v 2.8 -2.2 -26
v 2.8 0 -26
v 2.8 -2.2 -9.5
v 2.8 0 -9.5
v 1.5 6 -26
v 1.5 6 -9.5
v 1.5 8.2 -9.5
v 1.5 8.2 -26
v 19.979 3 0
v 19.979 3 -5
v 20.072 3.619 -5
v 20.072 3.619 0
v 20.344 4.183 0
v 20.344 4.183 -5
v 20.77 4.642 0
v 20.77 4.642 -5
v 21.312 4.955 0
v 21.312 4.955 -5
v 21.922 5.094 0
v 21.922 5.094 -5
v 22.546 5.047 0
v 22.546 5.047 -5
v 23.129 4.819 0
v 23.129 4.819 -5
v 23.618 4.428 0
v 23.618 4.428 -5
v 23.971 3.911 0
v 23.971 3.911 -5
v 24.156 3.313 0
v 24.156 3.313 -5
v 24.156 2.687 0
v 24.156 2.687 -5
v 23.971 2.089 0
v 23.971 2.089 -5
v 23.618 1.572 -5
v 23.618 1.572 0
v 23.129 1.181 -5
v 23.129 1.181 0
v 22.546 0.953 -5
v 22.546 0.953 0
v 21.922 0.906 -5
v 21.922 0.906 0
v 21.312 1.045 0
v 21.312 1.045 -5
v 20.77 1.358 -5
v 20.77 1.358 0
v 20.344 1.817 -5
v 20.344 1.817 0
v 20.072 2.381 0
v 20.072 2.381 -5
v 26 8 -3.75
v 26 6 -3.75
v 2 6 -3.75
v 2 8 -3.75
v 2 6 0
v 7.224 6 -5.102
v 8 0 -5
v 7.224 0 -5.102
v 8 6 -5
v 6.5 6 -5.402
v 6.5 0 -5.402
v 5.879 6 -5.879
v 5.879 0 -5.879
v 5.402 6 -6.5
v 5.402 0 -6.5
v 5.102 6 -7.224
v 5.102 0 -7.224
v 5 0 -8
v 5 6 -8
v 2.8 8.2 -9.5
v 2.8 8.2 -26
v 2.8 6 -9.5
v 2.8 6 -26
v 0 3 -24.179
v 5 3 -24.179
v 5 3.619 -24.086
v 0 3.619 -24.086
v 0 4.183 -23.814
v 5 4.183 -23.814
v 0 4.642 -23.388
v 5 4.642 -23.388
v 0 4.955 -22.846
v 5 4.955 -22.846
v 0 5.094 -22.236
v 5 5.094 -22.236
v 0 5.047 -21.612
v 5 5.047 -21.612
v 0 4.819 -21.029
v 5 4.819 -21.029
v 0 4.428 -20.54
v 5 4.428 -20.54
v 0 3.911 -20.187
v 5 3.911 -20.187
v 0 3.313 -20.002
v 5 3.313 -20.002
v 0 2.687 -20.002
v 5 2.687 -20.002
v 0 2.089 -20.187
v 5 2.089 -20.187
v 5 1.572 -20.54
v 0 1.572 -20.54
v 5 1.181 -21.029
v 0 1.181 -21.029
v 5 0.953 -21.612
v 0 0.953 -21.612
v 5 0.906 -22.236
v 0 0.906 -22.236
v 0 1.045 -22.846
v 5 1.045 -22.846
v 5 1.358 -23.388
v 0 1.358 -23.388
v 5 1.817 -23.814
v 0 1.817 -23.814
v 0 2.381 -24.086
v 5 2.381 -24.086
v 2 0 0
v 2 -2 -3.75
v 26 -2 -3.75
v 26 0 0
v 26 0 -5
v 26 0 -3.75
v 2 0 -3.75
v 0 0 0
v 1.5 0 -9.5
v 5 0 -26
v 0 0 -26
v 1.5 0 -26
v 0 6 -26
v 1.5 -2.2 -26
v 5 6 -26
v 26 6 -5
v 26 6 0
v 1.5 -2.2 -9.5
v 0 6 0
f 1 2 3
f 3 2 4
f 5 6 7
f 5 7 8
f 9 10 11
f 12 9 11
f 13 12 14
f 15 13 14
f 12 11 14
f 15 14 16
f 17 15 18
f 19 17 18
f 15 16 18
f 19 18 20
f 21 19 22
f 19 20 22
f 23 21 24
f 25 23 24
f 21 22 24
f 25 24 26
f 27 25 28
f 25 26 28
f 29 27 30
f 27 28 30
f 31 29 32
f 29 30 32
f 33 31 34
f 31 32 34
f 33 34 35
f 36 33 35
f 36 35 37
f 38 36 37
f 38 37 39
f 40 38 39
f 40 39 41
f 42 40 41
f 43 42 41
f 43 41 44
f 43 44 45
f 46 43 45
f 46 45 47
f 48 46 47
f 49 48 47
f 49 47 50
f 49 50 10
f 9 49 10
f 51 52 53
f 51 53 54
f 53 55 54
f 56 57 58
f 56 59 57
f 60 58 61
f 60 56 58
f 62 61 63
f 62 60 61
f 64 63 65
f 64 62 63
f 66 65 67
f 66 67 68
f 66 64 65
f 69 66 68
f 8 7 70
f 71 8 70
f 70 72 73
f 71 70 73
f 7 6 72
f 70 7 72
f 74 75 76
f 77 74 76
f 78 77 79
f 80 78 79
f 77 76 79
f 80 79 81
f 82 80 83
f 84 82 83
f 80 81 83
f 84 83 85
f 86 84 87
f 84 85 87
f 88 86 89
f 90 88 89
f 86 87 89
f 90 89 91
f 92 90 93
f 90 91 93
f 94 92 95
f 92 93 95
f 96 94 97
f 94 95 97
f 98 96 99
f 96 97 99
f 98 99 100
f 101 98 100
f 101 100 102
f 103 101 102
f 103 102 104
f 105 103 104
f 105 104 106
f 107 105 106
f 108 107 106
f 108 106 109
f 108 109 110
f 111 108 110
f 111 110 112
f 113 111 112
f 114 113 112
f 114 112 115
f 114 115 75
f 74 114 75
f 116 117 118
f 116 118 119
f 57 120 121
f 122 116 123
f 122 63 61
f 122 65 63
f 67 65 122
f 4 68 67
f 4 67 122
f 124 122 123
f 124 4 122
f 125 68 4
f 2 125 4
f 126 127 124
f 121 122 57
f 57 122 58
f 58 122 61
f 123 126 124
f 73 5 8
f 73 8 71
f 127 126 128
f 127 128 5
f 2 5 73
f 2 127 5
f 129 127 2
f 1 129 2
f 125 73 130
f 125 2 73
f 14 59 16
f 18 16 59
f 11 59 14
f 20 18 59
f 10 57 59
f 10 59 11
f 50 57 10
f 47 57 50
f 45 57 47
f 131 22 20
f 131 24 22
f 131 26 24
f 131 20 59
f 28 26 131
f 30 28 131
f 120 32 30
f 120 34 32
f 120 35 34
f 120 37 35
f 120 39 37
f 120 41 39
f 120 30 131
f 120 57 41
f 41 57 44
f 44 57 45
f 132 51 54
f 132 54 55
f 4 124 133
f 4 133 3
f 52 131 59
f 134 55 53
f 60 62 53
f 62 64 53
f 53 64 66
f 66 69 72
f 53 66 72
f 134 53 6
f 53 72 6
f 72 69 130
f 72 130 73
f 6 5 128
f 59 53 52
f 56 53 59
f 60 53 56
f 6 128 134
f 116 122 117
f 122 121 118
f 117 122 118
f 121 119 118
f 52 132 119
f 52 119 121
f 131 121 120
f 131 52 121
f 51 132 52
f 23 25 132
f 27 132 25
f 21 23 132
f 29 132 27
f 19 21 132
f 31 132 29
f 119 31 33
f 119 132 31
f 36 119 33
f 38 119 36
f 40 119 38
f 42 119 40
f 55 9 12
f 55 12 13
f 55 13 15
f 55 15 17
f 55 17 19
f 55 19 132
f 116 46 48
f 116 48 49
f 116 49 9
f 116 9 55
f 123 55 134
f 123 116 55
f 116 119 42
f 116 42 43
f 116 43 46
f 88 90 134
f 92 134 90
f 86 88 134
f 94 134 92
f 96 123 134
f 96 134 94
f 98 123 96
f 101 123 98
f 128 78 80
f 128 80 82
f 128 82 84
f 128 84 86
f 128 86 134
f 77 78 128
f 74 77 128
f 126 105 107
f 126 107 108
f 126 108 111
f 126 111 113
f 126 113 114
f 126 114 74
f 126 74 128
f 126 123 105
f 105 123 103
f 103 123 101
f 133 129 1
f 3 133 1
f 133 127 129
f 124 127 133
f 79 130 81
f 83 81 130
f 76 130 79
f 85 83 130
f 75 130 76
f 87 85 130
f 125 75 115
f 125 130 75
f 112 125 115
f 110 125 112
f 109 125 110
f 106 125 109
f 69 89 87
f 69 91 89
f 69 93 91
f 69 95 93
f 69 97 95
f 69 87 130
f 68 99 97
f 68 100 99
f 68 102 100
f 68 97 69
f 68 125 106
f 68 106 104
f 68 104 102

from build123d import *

# Parameters (mm, degrees)
BOSS_EXTRUDE1_DEPTH = 6
SKETCH3_W           = 1.3
SKETCH3_H           = 16.5
BOSS_EXTRUDE2_DEPTH = 2.2
SKETCH4_W           = 1.3
SKETCH4_H           = 16.5
BOSS_EXTRUDE3_DEPTH = 2.2
BOSS_EXTRUDE4_DEPTH = 24
FILLET1_R           = 3
SKETCH6_R           = 2.1
CUT_EXTRUDE1_DEPTH  = 24
SKETCH7_R           = 2.1
CUT_EXTRUDE2_DEPTH  = 24


with BuildPart() as part:
    # Sketch1 → Boss-Extrude1 (new body)
    with BuildSketch(Plane(origin=(0, 0, 0), x_dir=(1, 0, 0), z_dir=(0, 1, 0))):
        Polygon((0, 0), (0, 26), (5, 26), (5, 5), (26, 5), (26, 0), align=None)
    extrude(amount=BOSS_EXTRUDE1_DEPTH)

    # Sketch3 → Boss-Extrude2 (add)
    with BuildSketch(Plane(origin=(0, 6, 0), x_dir=(1, 0, 0), z_dir=(0, 1, 0))):
        with Locations((2.15, 17.75)):
            Rectangle(SKETCH3_W, SKETCH3_H)
    extrude(amount=BOSS_EXTRUDE2_DEPTH)

    # Sketch4 → Boss-Extrude3 (add)
    with BuildSketch(Plane.XZ):
        with Locations((2.15, -17.75)):
            Rectangle(SKETCH4_W, SKETCH4_H)
    extrude(amount=BOSS_EXTRUDE3_DEPTH)

    # Sketch5 → Boss-Extrude4 (add)
    with BuildSketch(Plane(origin=(26, 0, 0), x_dir=(0, 0, -1), z_dir=(1, 0, 0))):
        Polygon((3.75, 6), (3.75, 8), (0, 6), align=None)
        Polygon((3.75, 0), (3.75, -2), (0, 0), align=None)
    extrude(amount=-BOSS_EXTRUDE4_DEPTH)

    # Fillet1
    fillet1_edges = [part.edges().sort_by_distance(p)[0] for p in [
        (5, 3, -5),
    ]]
    fillet(fillet1_edges, radius=FILLET1_R)

    # Sketch6 → Cut-Extrude1 (cut)
    with BuildSketch(Plane(origin=(0, 0, -5), x_dir=(-1, 0, 0), z_dir=(0, 0, -1))):
        with Locations((-22.079, 3)):
            Circle(SKETCH6_R)
    extrude(amount=-CUT_EXTRUDE1_DEPTH, mode=Mode.SUBTRACT)

    # Sketch7 → Cut-Extrude2 (cut)
    with BuildSketch(Plane(origin=(5, 0, 0), x_dir=(0, 0, -1), z_dir=(1, 0, 0))):
        with Locations((22.079, 3)):
            Circle(SKETCH7_R)
    extrude(amount=-CUT_EXTRUDE2_DEPTH, mode=Mode.SUBTRACT)


solid = part.part
